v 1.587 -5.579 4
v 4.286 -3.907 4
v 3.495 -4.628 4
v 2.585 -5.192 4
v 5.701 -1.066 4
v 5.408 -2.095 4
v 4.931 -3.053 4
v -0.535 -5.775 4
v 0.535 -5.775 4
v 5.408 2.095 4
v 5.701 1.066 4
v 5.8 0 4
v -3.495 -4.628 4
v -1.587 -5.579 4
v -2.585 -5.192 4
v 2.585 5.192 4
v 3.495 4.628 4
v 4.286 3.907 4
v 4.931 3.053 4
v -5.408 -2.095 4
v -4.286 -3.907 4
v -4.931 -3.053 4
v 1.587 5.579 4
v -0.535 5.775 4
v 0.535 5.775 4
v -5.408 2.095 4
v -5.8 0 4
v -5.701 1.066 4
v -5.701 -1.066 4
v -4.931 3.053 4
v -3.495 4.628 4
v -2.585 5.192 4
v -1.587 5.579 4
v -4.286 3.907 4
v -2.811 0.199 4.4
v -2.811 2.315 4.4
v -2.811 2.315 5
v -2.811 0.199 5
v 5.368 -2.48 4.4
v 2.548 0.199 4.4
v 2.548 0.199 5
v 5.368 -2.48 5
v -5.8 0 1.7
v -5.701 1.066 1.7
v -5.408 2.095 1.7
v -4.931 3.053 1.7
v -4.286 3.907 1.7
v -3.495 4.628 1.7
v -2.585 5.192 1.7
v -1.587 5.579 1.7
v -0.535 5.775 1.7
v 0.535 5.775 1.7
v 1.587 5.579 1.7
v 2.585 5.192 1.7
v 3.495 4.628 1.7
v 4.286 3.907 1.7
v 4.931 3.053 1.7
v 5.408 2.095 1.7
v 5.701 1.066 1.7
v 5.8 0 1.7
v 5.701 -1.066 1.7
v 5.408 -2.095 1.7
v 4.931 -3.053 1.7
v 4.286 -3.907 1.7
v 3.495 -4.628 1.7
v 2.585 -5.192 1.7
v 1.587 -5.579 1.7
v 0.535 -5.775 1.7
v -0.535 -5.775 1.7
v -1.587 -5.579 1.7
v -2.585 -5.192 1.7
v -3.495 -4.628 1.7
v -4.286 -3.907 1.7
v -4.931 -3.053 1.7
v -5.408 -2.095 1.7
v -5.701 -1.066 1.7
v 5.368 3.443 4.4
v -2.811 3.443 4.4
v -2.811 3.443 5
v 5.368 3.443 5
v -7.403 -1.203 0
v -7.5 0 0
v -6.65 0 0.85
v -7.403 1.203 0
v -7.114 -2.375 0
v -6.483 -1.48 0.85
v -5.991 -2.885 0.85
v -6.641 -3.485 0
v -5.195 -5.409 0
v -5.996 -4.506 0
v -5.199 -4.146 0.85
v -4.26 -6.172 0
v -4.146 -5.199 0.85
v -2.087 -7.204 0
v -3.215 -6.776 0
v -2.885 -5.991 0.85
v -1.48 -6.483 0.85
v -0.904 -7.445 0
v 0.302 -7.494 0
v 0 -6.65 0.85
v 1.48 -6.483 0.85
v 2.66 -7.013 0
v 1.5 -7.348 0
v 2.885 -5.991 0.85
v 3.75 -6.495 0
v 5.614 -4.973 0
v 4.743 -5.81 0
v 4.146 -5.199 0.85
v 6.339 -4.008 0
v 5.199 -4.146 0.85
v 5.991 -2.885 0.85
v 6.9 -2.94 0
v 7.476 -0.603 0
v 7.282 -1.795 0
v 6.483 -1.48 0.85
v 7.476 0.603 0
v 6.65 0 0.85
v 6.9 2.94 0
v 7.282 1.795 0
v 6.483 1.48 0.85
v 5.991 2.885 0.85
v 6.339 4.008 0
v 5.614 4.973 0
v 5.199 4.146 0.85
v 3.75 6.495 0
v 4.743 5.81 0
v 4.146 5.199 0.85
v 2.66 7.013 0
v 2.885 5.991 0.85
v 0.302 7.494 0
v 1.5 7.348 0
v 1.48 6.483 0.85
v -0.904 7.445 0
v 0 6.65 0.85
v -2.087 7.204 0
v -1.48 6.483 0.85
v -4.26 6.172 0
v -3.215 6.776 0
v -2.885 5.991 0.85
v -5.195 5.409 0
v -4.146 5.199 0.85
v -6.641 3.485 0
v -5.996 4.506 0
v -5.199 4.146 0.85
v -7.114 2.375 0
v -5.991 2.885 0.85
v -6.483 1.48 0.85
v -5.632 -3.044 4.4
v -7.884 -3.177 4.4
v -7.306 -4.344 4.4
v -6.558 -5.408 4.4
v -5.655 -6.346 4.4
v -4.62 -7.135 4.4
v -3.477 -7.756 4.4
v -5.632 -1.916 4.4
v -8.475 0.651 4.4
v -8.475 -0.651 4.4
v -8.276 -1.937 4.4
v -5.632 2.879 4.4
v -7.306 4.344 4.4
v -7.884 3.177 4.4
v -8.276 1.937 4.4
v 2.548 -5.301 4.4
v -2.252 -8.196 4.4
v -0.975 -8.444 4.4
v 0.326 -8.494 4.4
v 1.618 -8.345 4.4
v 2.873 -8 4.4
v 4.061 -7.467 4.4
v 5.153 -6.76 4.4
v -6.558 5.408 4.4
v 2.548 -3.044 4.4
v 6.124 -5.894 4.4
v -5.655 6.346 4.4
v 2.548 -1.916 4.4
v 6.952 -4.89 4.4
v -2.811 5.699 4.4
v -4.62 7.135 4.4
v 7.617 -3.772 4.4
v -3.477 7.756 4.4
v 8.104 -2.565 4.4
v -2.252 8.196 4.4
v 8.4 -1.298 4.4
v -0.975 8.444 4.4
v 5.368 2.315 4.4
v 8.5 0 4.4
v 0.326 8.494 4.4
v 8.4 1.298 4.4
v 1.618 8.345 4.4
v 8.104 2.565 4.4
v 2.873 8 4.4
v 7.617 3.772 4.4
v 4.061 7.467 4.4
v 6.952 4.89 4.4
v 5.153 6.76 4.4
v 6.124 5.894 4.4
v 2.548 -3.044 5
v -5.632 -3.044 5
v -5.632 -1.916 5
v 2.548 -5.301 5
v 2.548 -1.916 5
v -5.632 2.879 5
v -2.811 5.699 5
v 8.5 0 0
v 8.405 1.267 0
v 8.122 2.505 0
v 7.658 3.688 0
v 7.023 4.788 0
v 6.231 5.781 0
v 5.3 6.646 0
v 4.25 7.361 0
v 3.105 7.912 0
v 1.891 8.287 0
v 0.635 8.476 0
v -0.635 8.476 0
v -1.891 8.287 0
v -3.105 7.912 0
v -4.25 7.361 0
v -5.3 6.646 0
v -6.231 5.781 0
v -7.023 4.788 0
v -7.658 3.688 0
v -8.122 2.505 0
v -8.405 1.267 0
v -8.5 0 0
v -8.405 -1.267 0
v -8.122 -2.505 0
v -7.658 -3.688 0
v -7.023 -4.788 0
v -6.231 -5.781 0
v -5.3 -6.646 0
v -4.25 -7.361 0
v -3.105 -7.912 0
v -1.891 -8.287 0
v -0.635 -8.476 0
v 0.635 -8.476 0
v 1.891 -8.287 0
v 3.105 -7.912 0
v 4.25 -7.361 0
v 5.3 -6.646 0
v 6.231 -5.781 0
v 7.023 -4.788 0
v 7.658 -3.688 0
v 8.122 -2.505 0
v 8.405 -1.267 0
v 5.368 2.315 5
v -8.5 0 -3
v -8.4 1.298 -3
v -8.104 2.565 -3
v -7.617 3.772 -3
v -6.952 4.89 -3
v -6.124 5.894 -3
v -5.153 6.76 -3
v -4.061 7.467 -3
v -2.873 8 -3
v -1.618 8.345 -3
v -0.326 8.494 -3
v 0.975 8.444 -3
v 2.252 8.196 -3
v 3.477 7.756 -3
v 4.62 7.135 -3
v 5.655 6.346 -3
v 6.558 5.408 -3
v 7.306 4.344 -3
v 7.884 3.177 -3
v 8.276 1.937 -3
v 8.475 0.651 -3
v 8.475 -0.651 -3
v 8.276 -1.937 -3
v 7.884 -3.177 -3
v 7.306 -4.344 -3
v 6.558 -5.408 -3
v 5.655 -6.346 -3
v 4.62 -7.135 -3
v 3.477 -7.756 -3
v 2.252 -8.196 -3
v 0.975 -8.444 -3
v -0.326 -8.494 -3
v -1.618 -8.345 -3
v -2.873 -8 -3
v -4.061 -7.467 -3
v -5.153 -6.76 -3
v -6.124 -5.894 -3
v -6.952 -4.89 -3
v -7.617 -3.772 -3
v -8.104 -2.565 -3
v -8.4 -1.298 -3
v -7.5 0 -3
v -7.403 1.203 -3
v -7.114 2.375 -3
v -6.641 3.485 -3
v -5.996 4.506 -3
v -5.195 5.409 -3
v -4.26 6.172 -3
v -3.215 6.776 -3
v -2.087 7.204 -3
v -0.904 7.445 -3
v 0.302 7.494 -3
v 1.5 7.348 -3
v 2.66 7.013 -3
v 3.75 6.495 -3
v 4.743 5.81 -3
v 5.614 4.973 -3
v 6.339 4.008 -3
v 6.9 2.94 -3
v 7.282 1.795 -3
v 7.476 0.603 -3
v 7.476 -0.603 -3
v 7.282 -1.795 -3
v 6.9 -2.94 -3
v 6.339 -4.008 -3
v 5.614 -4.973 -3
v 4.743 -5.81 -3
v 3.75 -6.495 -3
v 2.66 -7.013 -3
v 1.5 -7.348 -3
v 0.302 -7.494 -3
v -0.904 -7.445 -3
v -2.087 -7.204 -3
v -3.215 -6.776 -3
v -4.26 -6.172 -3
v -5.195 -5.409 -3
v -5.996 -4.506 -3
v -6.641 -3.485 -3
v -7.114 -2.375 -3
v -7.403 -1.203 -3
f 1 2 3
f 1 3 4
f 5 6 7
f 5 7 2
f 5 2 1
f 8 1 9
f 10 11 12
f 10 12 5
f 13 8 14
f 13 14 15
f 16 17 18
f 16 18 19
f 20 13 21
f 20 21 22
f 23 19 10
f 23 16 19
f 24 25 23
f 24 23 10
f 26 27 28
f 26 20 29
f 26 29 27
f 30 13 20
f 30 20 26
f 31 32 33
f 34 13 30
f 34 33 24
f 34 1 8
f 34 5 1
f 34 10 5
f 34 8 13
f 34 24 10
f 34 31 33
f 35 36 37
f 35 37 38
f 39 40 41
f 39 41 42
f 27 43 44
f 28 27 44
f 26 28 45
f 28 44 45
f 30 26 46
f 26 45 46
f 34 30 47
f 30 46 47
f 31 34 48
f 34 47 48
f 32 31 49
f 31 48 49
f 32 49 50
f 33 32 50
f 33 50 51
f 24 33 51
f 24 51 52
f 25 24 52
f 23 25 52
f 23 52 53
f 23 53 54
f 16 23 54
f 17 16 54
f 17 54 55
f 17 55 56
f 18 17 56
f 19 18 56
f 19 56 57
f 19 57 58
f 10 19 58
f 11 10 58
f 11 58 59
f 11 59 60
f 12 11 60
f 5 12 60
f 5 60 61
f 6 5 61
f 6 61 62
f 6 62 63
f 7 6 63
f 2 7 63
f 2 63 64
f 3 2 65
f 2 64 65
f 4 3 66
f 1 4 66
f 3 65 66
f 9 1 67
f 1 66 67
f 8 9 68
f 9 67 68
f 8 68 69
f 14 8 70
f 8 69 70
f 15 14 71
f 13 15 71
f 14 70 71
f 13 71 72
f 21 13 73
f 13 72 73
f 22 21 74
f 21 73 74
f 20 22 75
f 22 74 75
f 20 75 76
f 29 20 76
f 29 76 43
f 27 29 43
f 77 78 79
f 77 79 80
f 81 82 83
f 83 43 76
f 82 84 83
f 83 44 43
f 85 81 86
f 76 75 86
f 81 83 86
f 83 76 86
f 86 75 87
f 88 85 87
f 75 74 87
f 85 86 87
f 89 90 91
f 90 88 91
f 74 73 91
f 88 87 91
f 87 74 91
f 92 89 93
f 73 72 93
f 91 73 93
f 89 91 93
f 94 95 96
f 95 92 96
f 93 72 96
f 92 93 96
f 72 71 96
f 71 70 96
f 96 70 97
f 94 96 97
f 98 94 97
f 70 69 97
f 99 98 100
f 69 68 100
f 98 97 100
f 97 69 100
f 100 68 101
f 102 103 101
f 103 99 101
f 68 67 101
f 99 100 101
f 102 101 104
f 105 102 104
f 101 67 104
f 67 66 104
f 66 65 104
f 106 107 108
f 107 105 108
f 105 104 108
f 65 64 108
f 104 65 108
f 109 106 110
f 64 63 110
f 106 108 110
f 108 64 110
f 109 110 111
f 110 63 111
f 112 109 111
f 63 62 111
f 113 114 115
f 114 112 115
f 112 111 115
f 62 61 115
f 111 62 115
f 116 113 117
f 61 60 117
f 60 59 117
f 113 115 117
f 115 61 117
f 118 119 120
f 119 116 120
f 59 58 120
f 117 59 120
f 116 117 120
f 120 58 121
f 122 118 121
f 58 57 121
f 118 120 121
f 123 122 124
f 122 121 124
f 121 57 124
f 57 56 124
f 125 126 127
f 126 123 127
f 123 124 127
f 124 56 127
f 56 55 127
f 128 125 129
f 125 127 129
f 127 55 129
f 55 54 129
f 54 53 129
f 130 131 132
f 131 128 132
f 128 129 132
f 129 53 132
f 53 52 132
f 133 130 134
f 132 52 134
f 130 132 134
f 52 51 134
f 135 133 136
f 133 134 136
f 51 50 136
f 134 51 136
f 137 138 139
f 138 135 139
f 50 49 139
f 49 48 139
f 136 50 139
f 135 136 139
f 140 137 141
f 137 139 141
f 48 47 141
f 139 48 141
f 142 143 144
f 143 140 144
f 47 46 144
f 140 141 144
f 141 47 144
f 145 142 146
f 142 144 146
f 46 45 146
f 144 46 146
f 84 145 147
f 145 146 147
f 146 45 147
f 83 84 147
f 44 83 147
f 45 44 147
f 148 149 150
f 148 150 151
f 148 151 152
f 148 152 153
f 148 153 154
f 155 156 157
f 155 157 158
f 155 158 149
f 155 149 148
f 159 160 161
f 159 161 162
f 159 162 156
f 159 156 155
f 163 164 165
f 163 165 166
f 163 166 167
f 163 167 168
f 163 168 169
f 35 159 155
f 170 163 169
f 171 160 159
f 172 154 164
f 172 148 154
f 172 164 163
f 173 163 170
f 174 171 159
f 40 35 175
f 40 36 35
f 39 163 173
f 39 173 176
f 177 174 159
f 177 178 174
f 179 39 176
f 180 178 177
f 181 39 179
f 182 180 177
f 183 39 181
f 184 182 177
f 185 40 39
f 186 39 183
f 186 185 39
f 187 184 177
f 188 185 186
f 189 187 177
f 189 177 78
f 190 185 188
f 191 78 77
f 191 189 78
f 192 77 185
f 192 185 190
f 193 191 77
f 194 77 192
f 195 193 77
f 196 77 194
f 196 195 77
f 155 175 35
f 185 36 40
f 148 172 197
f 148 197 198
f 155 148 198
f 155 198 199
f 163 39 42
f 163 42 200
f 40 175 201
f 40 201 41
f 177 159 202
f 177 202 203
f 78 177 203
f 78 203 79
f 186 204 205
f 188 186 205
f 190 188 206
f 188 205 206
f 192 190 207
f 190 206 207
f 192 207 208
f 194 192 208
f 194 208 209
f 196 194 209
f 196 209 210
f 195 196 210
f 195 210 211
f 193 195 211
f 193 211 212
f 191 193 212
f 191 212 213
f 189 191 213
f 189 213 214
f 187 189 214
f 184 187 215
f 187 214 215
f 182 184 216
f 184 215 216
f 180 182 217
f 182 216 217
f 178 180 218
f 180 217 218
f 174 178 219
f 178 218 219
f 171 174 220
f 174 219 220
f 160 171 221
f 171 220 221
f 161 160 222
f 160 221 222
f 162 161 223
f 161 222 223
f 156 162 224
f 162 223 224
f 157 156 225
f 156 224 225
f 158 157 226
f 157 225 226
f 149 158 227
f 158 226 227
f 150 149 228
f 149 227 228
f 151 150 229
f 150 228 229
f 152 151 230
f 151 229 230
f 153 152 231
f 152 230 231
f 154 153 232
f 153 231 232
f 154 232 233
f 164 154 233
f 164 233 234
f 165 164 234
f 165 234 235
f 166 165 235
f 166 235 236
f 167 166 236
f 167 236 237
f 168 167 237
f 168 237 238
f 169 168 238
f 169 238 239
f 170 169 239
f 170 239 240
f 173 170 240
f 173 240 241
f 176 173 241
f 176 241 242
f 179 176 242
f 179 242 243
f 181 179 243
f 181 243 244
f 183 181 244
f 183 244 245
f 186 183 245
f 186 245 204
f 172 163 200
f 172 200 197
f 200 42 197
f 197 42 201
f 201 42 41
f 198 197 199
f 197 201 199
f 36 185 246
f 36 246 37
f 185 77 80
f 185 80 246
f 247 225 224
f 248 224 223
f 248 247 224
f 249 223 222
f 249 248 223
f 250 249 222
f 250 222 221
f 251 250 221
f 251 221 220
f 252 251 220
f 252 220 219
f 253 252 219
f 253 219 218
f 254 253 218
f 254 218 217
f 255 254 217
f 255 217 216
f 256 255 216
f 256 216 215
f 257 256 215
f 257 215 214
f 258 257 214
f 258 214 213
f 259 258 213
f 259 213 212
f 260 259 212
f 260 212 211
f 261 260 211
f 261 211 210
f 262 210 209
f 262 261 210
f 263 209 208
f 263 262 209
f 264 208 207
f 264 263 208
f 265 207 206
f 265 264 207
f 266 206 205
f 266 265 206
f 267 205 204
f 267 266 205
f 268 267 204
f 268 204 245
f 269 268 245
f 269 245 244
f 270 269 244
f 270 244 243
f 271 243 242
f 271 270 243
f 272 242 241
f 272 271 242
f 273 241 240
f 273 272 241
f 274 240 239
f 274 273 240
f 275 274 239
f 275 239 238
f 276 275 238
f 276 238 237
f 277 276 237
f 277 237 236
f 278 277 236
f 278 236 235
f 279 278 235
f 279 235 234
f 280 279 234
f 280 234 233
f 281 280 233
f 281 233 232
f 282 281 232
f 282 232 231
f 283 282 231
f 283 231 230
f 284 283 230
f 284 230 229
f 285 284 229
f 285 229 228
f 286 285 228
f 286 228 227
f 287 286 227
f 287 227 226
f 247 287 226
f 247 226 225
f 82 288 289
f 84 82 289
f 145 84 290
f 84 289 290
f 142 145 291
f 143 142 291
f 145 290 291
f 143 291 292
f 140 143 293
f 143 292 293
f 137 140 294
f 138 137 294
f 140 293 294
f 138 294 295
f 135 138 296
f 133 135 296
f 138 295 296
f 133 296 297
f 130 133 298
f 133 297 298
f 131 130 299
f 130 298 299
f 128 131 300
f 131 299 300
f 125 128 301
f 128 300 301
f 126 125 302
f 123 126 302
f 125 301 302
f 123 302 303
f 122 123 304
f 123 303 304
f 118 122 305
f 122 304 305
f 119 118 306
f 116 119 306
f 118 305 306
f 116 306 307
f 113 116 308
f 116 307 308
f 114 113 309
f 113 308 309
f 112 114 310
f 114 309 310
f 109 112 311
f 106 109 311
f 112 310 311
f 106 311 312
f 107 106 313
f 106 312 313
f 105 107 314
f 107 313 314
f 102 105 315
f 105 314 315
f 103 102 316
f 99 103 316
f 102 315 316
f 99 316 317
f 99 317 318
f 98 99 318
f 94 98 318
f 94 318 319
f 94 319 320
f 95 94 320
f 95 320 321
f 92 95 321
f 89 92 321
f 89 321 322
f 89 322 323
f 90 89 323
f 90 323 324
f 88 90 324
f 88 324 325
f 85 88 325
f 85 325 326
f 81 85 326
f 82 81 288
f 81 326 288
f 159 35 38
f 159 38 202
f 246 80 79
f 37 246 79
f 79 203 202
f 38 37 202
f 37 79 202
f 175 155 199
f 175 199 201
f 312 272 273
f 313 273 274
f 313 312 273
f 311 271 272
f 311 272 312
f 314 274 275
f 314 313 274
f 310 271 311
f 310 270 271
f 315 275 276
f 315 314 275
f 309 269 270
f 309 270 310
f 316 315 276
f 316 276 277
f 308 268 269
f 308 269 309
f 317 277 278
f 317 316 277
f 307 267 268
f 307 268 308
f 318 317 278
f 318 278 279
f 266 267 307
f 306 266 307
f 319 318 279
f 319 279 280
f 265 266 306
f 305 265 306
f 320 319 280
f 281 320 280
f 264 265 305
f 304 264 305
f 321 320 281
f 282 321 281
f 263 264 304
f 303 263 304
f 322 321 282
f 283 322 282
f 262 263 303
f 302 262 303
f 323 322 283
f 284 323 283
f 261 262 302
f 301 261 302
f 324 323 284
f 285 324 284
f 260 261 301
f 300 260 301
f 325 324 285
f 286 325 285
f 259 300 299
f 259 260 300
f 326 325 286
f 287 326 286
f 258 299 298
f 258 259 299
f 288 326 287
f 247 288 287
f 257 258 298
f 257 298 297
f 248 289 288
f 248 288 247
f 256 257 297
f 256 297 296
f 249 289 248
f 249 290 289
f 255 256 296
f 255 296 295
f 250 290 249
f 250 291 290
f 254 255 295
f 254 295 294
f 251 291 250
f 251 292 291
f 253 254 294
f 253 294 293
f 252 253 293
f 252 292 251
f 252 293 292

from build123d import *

# Parameters (mm, degrees)
SKETCH1_R           = 8.5
BOSS_EXTRUDE1_DEPTH = 4.4
SKETCH3_R           = 5.8
CUT_EXTRUDE1_DEPTH  = 4
BOSS_EXTRUDE3_START = 3
SKETCH4_R           = 8.5
SKETCH4_R_2         = 7.5
BOSS_EXTRUDE3_DEPTH = 3
BOSS_EXTRUDE4_DEPTH = 0.6


with BuildPart() as part:
    # Sketch1 → Boss-Extrude1 (new body)
    with BuildSketch(Plane.XY):
        Circle(SKETCH1_R)
    extrude(amount=BOSS_EXTRUDE1_DEPTH)

    # Sketch3 → Cut-Extrude1 (cut)
    with BuildSketch(Plane(origin=(0, 0, 0), x_dir=(-1, 0, 0), z_dir=(0, 0, -1))):
        Circle(SKETCH3_R)
    extrude(amount=-CUT_EXTRUDE1_DEPTH, mode=Mode.SUBTRACT)

    # Sketch4 → Boss-Extrude3 (add)
    with BuildSketch(Plane(origin=(0, 0, 0), x_dir=(-1, 0, 0), z_dir=(0, 0, -1)).offset(BOSS_EXTRUDE3_START)):
        Circle(SKETCH4_R)
        Circle(SKETCH4_R_2, mode=Mode.SUBTRACT)
    extrude(amount=-BOSS_EXTRUDE3_DEPTH)

    # Sketch6 → Cut-Revolve1 (revolve, cut)
    with BuildSketch(Plane(origin=(0, 0, 0), x_dir=(1, 0, 0), z_dir=(0, 1, 0)), mode=Mode.PRIVATE) as cut_revolve1_sk:
        Polygon((7.5, 0), (5.8, -1.7), (5.8, 0), align=None)
    revolve(cut_revolve1_sk.sketch.rotate(Axis((0, 0, -5.5), (0, 0, 1)), 180), axis=Axis((0, 0, -5.5), (0, 0, 1)), mode=Mode.SUBTRACT)

    # Sketch2 → Boss-Extrude4 (add)
    with BuildSketch(Plane.XY.offset(4.4)):
        Polygon((-5.631532004, 2.878926263), (-2.811019183, 5.699439083), (-2.811019183, 3.443028827), (5.368467996, 3.443028827), (5.368467996, 2.314823699), (-2.811019183, 2.314823699), (-2.811019183, 0.199439083), align=None)
        Polygon((5.368467996, -2.480048096), (2.547955176, -5.300560917), (2.547955176, -3.04415066), (-5.631532004, -3.04415066), (-5.631532004, -1.915945532), (2.547955176, -1.915945532), (2.547955176, 0.199439083), align=None)
    extrude(amount=BOSS_EXTRUDE4_DEPTH)


solid = part.part
